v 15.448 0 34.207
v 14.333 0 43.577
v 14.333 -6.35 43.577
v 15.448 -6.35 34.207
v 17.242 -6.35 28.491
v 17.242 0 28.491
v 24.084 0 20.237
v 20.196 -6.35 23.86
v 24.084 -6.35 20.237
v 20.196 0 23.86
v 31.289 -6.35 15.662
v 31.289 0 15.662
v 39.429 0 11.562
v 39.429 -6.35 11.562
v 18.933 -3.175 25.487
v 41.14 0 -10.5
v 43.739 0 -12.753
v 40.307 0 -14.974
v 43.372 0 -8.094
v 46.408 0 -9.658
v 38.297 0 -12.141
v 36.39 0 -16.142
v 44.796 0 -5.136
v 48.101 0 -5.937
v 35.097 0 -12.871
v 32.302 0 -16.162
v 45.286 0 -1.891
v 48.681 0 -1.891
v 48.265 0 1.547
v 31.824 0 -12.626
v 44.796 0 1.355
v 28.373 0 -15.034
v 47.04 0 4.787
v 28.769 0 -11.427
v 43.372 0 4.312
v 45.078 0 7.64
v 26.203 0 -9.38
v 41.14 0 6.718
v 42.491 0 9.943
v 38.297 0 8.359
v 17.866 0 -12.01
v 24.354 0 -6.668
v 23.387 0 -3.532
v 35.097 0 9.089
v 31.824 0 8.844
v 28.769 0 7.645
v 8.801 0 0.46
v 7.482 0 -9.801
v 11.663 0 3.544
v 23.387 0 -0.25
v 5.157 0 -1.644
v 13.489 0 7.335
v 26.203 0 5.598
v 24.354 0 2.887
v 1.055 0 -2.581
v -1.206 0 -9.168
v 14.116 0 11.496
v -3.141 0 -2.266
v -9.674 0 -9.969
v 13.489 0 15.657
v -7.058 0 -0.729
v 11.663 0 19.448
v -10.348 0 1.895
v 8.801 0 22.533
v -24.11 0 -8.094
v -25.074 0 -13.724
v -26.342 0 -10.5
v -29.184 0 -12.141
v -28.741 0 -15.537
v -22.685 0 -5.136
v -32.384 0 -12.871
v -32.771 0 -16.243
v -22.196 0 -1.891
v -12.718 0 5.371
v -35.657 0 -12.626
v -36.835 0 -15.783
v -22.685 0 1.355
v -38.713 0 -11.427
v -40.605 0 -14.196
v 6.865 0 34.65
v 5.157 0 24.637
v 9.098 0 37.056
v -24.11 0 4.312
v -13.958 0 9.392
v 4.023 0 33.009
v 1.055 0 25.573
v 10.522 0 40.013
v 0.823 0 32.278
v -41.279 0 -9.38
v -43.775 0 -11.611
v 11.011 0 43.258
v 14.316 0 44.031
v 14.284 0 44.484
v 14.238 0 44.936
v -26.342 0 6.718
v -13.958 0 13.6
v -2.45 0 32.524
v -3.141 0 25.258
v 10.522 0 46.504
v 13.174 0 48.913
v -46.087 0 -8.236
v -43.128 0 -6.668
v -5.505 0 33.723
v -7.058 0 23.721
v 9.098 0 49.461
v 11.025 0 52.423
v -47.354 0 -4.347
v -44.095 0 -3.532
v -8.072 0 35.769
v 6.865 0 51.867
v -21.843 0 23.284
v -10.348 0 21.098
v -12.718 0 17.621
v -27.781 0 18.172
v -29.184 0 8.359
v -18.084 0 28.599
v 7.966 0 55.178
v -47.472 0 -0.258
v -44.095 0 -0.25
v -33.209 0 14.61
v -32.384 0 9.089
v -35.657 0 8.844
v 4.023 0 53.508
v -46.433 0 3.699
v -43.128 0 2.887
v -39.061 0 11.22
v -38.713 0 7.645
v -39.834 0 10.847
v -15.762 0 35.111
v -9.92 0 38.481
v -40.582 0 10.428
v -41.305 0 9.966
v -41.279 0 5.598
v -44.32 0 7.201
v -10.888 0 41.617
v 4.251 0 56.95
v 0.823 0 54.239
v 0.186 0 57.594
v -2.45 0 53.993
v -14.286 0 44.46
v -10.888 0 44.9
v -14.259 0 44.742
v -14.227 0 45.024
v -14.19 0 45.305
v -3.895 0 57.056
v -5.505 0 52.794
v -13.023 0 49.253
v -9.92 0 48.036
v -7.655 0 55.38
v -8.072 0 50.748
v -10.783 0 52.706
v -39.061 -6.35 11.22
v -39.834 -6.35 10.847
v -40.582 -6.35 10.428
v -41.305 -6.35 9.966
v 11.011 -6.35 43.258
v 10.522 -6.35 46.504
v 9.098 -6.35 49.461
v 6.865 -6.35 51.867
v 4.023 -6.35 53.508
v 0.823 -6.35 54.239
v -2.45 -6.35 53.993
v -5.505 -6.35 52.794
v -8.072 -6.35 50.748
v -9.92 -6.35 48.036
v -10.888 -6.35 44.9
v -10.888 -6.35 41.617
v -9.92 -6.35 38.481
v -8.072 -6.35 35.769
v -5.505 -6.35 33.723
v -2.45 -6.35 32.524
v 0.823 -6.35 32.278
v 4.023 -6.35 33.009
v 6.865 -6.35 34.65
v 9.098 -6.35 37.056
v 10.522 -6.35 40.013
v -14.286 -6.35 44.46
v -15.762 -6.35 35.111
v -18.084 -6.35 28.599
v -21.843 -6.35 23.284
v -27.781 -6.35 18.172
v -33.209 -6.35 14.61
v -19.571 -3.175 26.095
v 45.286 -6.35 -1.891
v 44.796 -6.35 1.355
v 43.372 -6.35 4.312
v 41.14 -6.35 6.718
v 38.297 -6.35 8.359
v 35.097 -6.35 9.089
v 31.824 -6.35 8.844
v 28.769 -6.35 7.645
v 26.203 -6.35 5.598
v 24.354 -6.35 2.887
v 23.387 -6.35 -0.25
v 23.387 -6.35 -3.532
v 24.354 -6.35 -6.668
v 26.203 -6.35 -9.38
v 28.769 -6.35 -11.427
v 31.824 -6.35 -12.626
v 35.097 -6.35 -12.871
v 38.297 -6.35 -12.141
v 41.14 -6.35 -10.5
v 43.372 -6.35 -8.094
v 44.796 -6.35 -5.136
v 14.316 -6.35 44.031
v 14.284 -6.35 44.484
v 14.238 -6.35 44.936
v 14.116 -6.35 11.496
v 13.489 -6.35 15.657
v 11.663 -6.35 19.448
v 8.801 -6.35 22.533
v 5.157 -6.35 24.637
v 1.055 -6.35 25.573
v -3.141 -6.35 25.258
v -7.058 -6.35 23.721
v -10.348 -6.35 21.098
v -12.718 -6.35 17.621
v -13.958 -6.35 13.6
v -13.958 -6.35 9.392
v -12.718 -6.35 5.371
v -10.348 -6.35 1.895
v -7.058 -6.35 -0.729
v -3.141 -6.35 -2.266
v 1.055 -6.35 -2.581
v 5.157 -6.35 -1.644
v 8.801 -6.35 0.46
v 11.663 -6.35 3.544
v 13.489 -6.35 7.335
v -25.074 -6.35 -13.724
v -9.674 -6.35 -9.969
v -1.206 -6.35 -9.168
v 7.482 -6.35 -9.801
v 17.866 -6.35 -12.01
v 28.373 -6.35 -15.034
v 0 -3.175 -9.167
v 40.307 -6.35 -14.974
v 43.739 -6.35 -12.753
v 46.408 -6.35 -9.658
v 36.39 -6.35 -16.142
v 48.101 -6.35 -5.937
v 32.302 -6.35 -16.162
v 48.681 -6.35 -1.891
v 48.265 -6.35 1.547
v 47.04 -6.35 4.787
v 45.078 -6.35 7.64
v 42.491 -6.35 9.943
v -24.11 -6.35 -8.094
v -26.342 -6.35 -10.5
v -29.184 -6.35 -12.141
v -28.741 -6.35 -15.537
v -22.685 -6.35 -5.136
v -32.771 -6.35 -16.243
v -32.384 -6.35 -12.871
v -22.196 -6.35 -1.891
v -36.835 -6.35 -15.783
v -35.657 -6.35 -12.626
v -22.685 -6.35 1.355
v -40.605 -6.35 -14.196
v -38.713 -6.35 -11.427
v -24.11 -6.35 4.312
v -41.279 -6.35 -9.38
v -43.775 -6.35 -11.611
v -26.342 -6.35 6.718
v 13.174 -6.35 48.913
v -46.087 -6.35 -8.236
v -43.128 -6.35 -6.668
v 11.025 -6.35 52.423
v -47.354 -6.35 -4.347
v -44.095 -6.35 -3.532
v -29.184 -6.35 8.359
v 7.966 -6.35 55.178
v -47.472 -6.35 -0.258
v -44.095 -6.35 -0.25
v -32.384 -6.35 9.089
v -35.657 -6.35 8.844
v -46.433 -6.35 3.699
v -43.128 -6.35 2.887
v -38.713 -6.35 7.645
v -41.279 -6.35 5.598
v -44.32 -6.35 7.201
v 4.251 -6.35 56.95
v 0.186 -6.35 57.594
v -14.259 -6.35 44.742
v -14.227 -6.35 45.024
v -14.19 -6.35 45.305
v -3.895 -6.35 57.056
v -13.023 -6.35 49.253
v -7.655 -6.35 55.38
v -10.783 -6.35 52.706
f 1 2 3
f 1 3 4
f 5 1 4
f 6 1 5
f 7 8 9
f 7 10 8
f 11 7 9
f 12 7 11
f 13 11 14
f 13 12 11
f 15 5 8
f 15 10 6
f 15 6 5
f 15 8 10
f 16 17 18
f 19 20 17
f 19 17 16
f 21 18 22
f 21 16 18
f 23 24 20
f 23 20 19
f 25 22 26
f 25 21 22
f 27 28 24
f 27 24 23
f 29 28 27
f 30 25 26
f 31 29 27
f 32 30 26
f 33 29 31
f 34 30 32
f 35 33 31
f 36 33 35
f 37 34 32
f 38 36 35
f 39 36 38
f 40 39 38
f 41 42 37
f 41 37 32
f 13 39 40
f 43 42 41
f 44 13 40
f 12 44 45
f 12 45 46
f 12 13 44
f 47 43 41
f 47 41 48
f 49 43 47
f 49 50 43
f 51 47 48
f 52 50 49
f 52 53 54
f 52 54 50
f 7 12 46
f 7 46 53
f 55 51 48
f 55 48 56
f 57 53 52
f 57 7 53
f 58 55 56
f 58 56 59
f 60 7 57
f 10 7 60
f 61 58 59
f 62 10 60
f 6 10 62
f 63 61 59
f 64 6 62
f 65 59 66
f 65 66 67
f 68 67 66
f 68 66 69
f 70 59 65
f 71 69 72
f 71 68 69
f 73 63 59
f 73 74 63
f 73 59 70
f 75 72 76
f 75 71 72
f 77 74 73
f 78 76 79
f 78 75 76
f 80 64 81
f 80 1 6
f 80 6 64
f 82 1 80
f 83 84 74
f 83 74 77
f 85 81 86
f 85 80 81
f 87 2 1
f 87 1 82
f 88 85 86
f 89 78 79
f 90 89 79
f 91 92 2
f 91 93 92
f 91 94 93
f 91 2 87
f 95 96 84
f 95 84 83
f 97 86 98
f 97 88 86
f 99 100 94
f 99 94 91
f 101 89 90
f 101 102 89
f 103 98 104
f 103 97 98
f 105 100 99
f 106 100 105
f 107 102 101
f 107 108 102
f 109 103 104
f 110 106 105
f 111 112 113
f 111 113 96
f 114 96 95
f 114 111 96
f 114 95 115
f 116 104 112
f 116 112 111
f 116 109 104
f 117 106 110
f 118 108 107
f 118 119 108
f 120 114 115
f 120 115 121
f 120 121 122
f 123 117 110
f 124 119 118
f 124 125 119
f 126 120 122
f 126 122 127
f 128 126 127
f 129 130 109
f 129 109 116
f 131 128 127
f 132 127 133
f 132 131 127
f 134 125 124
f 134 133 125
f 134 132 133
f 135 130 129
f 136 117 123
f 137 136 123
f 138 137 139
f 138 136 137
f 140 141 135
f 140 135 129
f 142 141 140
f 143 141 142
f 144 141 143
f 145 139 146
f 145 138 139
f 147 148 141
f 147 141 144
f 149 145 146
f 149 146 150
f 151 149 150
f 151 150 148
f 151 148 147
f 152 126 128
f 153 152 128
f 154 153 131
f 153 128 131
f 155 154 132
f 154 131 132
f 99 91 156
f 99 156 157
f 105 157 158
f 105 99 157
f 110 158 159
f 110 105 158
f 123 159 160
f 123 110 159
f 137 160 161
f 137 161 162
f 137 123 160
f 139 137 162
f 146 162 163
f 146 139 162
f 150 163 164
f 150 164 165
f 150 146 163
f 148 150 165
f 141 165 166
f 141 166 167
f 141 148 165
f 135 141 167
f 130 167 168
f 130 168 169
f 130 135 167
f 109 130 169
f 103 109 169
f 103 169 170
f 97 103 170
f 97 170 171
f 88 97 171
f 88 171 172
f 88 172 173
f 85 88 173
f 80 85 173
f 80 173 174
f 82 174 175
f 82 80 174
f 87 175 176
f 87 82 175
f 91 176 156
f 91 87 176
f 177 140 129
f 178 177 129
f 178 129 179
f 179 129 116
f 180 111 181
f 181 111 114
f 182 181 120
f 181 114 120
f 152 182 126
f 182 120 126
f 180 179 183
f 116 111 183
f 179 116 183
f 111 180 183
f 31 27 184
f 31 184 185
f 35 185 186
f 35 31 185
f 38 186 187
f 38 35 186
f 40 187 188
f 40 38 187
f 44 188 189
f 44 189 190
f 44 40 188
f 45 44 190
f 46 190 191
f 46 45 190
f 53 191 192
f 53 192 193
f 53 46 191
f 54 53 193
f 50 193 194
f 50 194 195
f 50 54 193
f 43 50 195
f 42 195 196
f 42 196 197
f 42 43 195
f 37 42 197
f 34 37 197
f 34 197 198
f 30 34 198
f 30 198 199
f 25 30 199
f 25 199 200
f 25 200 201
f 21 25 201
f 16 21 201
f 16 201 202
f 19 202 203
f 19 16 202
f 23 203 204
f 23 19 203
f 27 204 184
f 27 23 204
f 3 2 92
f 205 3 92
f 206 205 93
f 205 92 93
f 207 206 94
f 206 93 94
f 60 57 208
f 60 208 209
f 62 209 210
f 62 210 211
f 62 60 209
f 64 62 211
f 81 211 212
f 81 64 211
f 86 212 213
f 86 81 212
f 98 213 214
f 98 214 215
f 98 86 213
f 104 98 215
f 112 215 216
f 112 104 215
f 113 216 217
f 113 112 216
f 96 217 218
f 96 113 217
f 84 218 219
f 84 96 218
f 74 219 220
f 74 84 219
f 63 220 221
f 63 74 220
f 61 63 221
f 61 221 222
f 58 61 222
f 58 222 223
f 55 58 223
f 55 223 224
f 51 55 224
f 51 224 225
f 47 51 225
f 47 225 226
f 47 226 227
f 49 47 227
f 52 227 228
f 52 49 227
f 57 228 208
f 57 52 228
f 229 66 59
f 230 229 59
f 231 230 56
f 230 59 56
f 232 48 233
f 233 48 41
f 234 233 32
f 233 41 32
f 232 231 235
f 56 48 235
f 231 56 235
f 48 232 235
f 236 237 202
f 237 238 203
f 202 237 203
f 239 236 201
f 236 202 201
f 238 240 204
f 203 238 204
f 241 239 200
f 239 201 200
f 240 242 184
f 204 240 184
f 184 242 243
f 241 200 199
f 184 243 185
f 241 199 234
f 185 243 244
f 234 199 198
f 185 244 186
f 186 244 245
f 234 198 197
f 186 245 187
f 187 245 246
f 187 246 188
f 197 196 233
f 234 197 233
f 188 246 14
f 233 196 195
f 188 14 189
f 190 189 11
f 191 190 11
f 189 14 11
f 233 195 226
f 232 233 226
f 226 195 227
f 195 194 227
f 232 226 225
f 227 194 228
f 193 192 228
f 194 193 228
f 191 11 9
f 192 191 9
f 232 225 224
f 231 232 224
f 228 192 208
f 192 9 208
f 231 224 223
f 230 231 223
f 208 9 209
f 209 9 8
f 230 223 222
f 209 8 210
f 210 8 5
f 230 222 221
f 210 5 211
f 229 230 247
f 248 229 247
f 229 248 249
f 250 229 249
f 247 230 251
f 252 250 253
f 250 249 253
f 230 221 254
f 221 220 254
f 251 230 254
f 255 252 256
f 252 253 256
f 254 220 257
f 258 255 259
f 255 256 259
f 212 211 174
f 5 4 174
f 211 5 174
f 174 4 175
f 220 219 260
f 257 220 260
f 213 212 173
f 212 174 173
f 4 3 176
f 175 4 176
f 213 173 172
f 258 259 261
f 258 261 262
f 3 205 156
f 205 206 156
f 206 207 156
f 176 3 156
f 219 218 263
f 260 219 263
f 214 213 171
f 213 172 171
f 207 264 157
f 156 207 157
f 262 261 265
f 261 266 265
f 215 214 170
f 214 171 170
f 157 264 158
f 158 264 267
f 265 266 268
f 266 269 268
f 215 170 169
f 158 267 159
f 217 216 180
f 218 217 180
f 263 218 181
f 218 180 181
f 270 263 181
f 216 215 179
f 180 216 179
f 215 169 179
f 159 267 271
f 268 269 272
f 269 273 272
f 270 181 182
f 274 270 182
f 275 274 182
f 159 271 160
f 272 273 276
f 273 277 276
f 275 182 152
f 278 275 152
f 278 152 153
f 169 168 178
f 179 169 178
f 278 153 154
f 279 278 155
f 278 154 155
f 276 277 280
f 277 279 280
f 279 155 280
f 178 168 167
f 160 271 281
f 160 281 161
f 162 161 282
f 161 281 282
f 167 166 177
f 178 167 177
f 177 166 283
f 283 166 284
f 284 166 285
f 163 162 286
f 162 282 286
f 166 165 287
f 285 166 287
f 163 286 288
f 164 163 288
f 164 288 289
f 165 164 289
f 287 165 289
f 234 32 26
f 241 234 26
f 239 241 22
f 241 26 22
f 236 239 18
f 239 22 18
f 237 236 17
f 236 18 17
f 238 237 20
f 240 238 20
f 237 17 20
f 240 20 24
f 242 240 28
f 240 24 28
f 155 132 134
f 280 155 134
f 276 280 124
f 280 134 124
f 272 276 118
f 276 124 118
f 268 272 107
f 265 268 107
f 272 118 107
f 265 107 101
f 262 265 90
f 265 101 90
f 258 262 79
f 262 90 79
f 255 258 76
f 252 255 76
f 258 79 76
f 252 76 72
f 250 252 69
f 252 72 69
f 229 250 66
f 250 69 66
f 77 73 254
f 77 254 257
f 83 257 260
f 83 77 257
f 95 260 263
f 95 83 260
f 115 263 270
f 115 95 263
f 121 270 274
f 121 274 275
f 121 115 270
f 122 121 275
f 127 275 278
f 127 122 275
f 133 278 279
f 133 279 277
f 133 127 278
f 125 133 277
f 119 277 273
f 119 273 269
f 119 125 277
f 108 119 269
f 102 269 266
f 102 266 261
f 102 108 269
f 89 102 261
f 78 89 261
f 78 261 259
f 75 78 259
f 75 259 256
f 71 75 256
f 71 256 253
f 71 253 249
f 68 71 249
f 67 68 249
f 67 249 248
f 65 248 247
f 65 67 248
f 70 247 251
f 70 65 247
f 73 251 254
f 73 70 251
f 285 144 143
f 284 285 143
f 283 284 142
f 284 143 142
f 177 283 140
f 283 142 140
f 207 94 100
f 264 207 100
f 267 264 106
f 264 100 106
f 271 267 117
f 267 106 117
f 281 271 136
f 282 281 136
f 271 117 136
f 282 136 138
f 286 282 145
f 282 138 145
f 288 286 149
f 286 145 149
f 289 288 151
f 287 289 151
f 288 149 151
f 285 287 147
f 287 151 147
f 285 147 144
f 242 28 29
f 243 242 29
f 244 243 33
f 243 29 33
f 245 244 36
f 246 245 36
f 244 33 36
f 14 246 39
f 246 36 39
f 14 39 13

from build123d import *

# Parameters (mm, degrees)
F0_R     = 11.0109
F0_R_2   = 14.1161629055
F1_DEPTH = 6.35


with BuildPart() as f1:
    # F0 (on Front) → F1 (new body)
    with BuildSketch(Plane.XZ):
        with BuildLine():
            add(Edge.make_bspline(
                [(14.2378477878, 44.936459669), (14.2692580265, 44.4830769346), (14.3006366518, 44.0296968618), (14.3328571489, 43.5767591031)],
                knots=[0, 0, 0, 0, 0.0305226673, 0.0305226673, 0.0305226673, 0.0305226673], degree=3))
            ThreePointArc((14.2378477878, 44.936459669), (0.1859137764, 57.5936038827), (-14.1895411716, 45.3051359496))
            add(Edge.make_bspline(
                [(-14.1895411716, 45.3051359496), (-14.2216158391, 45.0234232666), (-14.2536769794, 44.7417099752), (-14.2859418326, 44.4600835103)],
                knots=[0, 0, 0, 0, 0.0190929531, 0.0190929531, 0.0190929531, 0.0190929531], degree=3))
            ThreePointArc((-14.2859418326, 44.4600835103), (-0.6013623419, 28.9346434947), (14.336391997, 43.2584173977))
            ThreePointArc((14.336391997, 43.2584173977), (14.3355082577, 43.4175980628), (14.3328571489, 43.5767591031))
        make_face()
        with Locations((0, 43.2584173977)):
            Circle(F0_R, mode=Mode.SUBTRACT)
        with BuildLine():
            ThreePointArc((14.3328571489, 43.5767591031), (14.3015206028, 44.2577391378), (14.2378477878, 44.936459669))
            add(Edge.make_bspline(
                [(14.2378477878, 44.936459669), (14.2692580265, 44.4830769346), (14.3006366518, 44.0296968618), (14.3328571489, 43.5767591031)],
                knots=[0, 0, 0, 0, 0.0305226673, 0.0305226673, 0.0305226673, 0.0305226673], degree=3))
        make_face()
        with BuildLine():
            add(Edge.make_bspline(
                [(-14.1895411716, 45.3051359496), (-14.2216158391, 45.0234232666), (-14.2536769794, 44.7417099752), (-14.2859418326, 44.4600835103)],
                knots=[0, 0, 0, 0, 0.0190929531, 0.0190929531, 0.0190929531, 0.0190929531], degree=3))
            ThreePointArc((-14.1895411716, 45.3051359496), (-14.2440096703, 44.8833247809), (-14.2859418326, 44.4600835103))
        make_face()
        with BuildLine():
            add(Edge.make_bspline(
                [(14.3328571489, 43.5767591031), (14.8002600895, 37.0062695163), (16.2115652733, 22.8236179544), (31.2555625407, 15.5214679724), (39.4293133759, 11.5620974024)],
                knots=[0.0305226673, 0.0305226673, 0.0305226673, 0.0305226673, 0.4732962362, 1, 1, 1, 1], degree=3))
            ThreePointArc((14.3328571489, 43.5767591031), (14.3355082577, 43.4175980628), (14.336391997, 43.2584173977))
            ThreePointArc((14.336391997, 43.2584173977), (-0.6013623419, 28.9346434947), (-14.2859418326, 44.4600835103))
            add(Edge.make_bspline(
                [(-14.2859418326, 44.4600835103), (-15.0343143138, 37.9278518415), (-16.8442731817, 24.2460870484), (-31.2061924175, 15.6278170074), (-39.061412584, 11.2195897613)],
                knots=[0.0190929531, 0.0190929531, 0.0190929531, 0.0190929531, 0.4619476147, 0.9533331716, 0.9533331716, 0.9533331716, 0.9533331716], degree=3))
            ThreePointArc((-39.061412584, 11.2195897613), (-25.3936507621, 10.1551158407), (-18.8489380989, -1.8909438513))
            ThreePointArc((-18.8489380989, -1.8909438513), (-20.5002656427, -8.5762529664), (-25.0744124588, -13.7238175873))
            add(Edge.make_bspline(
                [(-25.0744124588, -13.7238175873), (-16.8412057321, -11.3905698061), (0.1735884464, -6.5816131812), (18.7761875451, -12.1510294851), (28.3732517974, -15.0335990669)],
                knots=[0, 0, 0, 0, 0.4839699757, 1, 1, 1, 1], degree=3))
            ThreePointArc((28.3732517974, -15.0335990669), (20.9715166849, 3.6392649404), (39.4293133759, 11.5620974024))
        make_face()
        with Locations((0, 11.4961732179)):
            Circle(F0_R_2, mode=Mode.SUBTRACT)
        with BuildLine():
            ThreePointArc((48.6813854206, -1.8909438513), (46.145116247, 6.2727739919), (39.4293133759, 11.5620974024))
            ThreePointArc((39.4293133759, 11.5620974024), (20.9715166849, 3.6392649404), (28.3732517974, -15.0335990669))
            ThreePointArc((28.3732517974, -15.0335990669), (42.1019872984, -13.9858774742), (48.6813854206, -1.8909438513))
        make_face()
        with Locations((34.2746041715, -1.8909438513)):
            Circle(F0_R, mode=Mode.SUBTRACT)
        with BuildLine():
            add(Edge.make_bspline(
                [(-39.061412584, 11.2195897613), (-39.8074219165, 10.8009409398), (-40.5561481429, 10.3834173098), (-41.3048749035, 9.9659258562)],
                knots=[0.9533331716, 0.9533331716, 0.9533331716, 0.9533331716, 1, 1, 1, 1], degree=3))
            ThreePointArc((-39.061412584, 11.2195897613), (-40.2112493235, 10.6430534333), (-41.3048749035, 9.9659258562))
        make_face()
        with BuildLine():
            ThreePointArc((-18.8489380989, -1.8909438513), (-25.3936507621, 10.1551158407), (-39.061412584, 11.2195897613))
            add(Edge.make_bspline(
                [(-39.061412584, 11.2195897613), (-39.8074219165, 10.8009409398), (-40.5561481429, 10.3834173098), (-41.3048749035, 9.9659258562)],
                knots=[0.9533331716, 0.9533331716, 0.9533331716, 0.9533331716, 1, 1, 1, 1], degree=3))
            ThreePointArc((-41.3048749035, 9.9659258562), (-45.0520404312, -10.0061839429), (-25.0744124588, -13.7238175873))
            ThreePointArc((-25.0744124588, -13.7238175873), (-20.5002656427, -8.5762529664), (-18.8489380989, -1.8909438513))
        make_face()
        with Locations((-33.2071557641, -1.8909438513)):
            Circle(F0_R, mode=Mode.SUBTRACT)
    extrude(amount=F1_DEPTH)


solid = f1.part
